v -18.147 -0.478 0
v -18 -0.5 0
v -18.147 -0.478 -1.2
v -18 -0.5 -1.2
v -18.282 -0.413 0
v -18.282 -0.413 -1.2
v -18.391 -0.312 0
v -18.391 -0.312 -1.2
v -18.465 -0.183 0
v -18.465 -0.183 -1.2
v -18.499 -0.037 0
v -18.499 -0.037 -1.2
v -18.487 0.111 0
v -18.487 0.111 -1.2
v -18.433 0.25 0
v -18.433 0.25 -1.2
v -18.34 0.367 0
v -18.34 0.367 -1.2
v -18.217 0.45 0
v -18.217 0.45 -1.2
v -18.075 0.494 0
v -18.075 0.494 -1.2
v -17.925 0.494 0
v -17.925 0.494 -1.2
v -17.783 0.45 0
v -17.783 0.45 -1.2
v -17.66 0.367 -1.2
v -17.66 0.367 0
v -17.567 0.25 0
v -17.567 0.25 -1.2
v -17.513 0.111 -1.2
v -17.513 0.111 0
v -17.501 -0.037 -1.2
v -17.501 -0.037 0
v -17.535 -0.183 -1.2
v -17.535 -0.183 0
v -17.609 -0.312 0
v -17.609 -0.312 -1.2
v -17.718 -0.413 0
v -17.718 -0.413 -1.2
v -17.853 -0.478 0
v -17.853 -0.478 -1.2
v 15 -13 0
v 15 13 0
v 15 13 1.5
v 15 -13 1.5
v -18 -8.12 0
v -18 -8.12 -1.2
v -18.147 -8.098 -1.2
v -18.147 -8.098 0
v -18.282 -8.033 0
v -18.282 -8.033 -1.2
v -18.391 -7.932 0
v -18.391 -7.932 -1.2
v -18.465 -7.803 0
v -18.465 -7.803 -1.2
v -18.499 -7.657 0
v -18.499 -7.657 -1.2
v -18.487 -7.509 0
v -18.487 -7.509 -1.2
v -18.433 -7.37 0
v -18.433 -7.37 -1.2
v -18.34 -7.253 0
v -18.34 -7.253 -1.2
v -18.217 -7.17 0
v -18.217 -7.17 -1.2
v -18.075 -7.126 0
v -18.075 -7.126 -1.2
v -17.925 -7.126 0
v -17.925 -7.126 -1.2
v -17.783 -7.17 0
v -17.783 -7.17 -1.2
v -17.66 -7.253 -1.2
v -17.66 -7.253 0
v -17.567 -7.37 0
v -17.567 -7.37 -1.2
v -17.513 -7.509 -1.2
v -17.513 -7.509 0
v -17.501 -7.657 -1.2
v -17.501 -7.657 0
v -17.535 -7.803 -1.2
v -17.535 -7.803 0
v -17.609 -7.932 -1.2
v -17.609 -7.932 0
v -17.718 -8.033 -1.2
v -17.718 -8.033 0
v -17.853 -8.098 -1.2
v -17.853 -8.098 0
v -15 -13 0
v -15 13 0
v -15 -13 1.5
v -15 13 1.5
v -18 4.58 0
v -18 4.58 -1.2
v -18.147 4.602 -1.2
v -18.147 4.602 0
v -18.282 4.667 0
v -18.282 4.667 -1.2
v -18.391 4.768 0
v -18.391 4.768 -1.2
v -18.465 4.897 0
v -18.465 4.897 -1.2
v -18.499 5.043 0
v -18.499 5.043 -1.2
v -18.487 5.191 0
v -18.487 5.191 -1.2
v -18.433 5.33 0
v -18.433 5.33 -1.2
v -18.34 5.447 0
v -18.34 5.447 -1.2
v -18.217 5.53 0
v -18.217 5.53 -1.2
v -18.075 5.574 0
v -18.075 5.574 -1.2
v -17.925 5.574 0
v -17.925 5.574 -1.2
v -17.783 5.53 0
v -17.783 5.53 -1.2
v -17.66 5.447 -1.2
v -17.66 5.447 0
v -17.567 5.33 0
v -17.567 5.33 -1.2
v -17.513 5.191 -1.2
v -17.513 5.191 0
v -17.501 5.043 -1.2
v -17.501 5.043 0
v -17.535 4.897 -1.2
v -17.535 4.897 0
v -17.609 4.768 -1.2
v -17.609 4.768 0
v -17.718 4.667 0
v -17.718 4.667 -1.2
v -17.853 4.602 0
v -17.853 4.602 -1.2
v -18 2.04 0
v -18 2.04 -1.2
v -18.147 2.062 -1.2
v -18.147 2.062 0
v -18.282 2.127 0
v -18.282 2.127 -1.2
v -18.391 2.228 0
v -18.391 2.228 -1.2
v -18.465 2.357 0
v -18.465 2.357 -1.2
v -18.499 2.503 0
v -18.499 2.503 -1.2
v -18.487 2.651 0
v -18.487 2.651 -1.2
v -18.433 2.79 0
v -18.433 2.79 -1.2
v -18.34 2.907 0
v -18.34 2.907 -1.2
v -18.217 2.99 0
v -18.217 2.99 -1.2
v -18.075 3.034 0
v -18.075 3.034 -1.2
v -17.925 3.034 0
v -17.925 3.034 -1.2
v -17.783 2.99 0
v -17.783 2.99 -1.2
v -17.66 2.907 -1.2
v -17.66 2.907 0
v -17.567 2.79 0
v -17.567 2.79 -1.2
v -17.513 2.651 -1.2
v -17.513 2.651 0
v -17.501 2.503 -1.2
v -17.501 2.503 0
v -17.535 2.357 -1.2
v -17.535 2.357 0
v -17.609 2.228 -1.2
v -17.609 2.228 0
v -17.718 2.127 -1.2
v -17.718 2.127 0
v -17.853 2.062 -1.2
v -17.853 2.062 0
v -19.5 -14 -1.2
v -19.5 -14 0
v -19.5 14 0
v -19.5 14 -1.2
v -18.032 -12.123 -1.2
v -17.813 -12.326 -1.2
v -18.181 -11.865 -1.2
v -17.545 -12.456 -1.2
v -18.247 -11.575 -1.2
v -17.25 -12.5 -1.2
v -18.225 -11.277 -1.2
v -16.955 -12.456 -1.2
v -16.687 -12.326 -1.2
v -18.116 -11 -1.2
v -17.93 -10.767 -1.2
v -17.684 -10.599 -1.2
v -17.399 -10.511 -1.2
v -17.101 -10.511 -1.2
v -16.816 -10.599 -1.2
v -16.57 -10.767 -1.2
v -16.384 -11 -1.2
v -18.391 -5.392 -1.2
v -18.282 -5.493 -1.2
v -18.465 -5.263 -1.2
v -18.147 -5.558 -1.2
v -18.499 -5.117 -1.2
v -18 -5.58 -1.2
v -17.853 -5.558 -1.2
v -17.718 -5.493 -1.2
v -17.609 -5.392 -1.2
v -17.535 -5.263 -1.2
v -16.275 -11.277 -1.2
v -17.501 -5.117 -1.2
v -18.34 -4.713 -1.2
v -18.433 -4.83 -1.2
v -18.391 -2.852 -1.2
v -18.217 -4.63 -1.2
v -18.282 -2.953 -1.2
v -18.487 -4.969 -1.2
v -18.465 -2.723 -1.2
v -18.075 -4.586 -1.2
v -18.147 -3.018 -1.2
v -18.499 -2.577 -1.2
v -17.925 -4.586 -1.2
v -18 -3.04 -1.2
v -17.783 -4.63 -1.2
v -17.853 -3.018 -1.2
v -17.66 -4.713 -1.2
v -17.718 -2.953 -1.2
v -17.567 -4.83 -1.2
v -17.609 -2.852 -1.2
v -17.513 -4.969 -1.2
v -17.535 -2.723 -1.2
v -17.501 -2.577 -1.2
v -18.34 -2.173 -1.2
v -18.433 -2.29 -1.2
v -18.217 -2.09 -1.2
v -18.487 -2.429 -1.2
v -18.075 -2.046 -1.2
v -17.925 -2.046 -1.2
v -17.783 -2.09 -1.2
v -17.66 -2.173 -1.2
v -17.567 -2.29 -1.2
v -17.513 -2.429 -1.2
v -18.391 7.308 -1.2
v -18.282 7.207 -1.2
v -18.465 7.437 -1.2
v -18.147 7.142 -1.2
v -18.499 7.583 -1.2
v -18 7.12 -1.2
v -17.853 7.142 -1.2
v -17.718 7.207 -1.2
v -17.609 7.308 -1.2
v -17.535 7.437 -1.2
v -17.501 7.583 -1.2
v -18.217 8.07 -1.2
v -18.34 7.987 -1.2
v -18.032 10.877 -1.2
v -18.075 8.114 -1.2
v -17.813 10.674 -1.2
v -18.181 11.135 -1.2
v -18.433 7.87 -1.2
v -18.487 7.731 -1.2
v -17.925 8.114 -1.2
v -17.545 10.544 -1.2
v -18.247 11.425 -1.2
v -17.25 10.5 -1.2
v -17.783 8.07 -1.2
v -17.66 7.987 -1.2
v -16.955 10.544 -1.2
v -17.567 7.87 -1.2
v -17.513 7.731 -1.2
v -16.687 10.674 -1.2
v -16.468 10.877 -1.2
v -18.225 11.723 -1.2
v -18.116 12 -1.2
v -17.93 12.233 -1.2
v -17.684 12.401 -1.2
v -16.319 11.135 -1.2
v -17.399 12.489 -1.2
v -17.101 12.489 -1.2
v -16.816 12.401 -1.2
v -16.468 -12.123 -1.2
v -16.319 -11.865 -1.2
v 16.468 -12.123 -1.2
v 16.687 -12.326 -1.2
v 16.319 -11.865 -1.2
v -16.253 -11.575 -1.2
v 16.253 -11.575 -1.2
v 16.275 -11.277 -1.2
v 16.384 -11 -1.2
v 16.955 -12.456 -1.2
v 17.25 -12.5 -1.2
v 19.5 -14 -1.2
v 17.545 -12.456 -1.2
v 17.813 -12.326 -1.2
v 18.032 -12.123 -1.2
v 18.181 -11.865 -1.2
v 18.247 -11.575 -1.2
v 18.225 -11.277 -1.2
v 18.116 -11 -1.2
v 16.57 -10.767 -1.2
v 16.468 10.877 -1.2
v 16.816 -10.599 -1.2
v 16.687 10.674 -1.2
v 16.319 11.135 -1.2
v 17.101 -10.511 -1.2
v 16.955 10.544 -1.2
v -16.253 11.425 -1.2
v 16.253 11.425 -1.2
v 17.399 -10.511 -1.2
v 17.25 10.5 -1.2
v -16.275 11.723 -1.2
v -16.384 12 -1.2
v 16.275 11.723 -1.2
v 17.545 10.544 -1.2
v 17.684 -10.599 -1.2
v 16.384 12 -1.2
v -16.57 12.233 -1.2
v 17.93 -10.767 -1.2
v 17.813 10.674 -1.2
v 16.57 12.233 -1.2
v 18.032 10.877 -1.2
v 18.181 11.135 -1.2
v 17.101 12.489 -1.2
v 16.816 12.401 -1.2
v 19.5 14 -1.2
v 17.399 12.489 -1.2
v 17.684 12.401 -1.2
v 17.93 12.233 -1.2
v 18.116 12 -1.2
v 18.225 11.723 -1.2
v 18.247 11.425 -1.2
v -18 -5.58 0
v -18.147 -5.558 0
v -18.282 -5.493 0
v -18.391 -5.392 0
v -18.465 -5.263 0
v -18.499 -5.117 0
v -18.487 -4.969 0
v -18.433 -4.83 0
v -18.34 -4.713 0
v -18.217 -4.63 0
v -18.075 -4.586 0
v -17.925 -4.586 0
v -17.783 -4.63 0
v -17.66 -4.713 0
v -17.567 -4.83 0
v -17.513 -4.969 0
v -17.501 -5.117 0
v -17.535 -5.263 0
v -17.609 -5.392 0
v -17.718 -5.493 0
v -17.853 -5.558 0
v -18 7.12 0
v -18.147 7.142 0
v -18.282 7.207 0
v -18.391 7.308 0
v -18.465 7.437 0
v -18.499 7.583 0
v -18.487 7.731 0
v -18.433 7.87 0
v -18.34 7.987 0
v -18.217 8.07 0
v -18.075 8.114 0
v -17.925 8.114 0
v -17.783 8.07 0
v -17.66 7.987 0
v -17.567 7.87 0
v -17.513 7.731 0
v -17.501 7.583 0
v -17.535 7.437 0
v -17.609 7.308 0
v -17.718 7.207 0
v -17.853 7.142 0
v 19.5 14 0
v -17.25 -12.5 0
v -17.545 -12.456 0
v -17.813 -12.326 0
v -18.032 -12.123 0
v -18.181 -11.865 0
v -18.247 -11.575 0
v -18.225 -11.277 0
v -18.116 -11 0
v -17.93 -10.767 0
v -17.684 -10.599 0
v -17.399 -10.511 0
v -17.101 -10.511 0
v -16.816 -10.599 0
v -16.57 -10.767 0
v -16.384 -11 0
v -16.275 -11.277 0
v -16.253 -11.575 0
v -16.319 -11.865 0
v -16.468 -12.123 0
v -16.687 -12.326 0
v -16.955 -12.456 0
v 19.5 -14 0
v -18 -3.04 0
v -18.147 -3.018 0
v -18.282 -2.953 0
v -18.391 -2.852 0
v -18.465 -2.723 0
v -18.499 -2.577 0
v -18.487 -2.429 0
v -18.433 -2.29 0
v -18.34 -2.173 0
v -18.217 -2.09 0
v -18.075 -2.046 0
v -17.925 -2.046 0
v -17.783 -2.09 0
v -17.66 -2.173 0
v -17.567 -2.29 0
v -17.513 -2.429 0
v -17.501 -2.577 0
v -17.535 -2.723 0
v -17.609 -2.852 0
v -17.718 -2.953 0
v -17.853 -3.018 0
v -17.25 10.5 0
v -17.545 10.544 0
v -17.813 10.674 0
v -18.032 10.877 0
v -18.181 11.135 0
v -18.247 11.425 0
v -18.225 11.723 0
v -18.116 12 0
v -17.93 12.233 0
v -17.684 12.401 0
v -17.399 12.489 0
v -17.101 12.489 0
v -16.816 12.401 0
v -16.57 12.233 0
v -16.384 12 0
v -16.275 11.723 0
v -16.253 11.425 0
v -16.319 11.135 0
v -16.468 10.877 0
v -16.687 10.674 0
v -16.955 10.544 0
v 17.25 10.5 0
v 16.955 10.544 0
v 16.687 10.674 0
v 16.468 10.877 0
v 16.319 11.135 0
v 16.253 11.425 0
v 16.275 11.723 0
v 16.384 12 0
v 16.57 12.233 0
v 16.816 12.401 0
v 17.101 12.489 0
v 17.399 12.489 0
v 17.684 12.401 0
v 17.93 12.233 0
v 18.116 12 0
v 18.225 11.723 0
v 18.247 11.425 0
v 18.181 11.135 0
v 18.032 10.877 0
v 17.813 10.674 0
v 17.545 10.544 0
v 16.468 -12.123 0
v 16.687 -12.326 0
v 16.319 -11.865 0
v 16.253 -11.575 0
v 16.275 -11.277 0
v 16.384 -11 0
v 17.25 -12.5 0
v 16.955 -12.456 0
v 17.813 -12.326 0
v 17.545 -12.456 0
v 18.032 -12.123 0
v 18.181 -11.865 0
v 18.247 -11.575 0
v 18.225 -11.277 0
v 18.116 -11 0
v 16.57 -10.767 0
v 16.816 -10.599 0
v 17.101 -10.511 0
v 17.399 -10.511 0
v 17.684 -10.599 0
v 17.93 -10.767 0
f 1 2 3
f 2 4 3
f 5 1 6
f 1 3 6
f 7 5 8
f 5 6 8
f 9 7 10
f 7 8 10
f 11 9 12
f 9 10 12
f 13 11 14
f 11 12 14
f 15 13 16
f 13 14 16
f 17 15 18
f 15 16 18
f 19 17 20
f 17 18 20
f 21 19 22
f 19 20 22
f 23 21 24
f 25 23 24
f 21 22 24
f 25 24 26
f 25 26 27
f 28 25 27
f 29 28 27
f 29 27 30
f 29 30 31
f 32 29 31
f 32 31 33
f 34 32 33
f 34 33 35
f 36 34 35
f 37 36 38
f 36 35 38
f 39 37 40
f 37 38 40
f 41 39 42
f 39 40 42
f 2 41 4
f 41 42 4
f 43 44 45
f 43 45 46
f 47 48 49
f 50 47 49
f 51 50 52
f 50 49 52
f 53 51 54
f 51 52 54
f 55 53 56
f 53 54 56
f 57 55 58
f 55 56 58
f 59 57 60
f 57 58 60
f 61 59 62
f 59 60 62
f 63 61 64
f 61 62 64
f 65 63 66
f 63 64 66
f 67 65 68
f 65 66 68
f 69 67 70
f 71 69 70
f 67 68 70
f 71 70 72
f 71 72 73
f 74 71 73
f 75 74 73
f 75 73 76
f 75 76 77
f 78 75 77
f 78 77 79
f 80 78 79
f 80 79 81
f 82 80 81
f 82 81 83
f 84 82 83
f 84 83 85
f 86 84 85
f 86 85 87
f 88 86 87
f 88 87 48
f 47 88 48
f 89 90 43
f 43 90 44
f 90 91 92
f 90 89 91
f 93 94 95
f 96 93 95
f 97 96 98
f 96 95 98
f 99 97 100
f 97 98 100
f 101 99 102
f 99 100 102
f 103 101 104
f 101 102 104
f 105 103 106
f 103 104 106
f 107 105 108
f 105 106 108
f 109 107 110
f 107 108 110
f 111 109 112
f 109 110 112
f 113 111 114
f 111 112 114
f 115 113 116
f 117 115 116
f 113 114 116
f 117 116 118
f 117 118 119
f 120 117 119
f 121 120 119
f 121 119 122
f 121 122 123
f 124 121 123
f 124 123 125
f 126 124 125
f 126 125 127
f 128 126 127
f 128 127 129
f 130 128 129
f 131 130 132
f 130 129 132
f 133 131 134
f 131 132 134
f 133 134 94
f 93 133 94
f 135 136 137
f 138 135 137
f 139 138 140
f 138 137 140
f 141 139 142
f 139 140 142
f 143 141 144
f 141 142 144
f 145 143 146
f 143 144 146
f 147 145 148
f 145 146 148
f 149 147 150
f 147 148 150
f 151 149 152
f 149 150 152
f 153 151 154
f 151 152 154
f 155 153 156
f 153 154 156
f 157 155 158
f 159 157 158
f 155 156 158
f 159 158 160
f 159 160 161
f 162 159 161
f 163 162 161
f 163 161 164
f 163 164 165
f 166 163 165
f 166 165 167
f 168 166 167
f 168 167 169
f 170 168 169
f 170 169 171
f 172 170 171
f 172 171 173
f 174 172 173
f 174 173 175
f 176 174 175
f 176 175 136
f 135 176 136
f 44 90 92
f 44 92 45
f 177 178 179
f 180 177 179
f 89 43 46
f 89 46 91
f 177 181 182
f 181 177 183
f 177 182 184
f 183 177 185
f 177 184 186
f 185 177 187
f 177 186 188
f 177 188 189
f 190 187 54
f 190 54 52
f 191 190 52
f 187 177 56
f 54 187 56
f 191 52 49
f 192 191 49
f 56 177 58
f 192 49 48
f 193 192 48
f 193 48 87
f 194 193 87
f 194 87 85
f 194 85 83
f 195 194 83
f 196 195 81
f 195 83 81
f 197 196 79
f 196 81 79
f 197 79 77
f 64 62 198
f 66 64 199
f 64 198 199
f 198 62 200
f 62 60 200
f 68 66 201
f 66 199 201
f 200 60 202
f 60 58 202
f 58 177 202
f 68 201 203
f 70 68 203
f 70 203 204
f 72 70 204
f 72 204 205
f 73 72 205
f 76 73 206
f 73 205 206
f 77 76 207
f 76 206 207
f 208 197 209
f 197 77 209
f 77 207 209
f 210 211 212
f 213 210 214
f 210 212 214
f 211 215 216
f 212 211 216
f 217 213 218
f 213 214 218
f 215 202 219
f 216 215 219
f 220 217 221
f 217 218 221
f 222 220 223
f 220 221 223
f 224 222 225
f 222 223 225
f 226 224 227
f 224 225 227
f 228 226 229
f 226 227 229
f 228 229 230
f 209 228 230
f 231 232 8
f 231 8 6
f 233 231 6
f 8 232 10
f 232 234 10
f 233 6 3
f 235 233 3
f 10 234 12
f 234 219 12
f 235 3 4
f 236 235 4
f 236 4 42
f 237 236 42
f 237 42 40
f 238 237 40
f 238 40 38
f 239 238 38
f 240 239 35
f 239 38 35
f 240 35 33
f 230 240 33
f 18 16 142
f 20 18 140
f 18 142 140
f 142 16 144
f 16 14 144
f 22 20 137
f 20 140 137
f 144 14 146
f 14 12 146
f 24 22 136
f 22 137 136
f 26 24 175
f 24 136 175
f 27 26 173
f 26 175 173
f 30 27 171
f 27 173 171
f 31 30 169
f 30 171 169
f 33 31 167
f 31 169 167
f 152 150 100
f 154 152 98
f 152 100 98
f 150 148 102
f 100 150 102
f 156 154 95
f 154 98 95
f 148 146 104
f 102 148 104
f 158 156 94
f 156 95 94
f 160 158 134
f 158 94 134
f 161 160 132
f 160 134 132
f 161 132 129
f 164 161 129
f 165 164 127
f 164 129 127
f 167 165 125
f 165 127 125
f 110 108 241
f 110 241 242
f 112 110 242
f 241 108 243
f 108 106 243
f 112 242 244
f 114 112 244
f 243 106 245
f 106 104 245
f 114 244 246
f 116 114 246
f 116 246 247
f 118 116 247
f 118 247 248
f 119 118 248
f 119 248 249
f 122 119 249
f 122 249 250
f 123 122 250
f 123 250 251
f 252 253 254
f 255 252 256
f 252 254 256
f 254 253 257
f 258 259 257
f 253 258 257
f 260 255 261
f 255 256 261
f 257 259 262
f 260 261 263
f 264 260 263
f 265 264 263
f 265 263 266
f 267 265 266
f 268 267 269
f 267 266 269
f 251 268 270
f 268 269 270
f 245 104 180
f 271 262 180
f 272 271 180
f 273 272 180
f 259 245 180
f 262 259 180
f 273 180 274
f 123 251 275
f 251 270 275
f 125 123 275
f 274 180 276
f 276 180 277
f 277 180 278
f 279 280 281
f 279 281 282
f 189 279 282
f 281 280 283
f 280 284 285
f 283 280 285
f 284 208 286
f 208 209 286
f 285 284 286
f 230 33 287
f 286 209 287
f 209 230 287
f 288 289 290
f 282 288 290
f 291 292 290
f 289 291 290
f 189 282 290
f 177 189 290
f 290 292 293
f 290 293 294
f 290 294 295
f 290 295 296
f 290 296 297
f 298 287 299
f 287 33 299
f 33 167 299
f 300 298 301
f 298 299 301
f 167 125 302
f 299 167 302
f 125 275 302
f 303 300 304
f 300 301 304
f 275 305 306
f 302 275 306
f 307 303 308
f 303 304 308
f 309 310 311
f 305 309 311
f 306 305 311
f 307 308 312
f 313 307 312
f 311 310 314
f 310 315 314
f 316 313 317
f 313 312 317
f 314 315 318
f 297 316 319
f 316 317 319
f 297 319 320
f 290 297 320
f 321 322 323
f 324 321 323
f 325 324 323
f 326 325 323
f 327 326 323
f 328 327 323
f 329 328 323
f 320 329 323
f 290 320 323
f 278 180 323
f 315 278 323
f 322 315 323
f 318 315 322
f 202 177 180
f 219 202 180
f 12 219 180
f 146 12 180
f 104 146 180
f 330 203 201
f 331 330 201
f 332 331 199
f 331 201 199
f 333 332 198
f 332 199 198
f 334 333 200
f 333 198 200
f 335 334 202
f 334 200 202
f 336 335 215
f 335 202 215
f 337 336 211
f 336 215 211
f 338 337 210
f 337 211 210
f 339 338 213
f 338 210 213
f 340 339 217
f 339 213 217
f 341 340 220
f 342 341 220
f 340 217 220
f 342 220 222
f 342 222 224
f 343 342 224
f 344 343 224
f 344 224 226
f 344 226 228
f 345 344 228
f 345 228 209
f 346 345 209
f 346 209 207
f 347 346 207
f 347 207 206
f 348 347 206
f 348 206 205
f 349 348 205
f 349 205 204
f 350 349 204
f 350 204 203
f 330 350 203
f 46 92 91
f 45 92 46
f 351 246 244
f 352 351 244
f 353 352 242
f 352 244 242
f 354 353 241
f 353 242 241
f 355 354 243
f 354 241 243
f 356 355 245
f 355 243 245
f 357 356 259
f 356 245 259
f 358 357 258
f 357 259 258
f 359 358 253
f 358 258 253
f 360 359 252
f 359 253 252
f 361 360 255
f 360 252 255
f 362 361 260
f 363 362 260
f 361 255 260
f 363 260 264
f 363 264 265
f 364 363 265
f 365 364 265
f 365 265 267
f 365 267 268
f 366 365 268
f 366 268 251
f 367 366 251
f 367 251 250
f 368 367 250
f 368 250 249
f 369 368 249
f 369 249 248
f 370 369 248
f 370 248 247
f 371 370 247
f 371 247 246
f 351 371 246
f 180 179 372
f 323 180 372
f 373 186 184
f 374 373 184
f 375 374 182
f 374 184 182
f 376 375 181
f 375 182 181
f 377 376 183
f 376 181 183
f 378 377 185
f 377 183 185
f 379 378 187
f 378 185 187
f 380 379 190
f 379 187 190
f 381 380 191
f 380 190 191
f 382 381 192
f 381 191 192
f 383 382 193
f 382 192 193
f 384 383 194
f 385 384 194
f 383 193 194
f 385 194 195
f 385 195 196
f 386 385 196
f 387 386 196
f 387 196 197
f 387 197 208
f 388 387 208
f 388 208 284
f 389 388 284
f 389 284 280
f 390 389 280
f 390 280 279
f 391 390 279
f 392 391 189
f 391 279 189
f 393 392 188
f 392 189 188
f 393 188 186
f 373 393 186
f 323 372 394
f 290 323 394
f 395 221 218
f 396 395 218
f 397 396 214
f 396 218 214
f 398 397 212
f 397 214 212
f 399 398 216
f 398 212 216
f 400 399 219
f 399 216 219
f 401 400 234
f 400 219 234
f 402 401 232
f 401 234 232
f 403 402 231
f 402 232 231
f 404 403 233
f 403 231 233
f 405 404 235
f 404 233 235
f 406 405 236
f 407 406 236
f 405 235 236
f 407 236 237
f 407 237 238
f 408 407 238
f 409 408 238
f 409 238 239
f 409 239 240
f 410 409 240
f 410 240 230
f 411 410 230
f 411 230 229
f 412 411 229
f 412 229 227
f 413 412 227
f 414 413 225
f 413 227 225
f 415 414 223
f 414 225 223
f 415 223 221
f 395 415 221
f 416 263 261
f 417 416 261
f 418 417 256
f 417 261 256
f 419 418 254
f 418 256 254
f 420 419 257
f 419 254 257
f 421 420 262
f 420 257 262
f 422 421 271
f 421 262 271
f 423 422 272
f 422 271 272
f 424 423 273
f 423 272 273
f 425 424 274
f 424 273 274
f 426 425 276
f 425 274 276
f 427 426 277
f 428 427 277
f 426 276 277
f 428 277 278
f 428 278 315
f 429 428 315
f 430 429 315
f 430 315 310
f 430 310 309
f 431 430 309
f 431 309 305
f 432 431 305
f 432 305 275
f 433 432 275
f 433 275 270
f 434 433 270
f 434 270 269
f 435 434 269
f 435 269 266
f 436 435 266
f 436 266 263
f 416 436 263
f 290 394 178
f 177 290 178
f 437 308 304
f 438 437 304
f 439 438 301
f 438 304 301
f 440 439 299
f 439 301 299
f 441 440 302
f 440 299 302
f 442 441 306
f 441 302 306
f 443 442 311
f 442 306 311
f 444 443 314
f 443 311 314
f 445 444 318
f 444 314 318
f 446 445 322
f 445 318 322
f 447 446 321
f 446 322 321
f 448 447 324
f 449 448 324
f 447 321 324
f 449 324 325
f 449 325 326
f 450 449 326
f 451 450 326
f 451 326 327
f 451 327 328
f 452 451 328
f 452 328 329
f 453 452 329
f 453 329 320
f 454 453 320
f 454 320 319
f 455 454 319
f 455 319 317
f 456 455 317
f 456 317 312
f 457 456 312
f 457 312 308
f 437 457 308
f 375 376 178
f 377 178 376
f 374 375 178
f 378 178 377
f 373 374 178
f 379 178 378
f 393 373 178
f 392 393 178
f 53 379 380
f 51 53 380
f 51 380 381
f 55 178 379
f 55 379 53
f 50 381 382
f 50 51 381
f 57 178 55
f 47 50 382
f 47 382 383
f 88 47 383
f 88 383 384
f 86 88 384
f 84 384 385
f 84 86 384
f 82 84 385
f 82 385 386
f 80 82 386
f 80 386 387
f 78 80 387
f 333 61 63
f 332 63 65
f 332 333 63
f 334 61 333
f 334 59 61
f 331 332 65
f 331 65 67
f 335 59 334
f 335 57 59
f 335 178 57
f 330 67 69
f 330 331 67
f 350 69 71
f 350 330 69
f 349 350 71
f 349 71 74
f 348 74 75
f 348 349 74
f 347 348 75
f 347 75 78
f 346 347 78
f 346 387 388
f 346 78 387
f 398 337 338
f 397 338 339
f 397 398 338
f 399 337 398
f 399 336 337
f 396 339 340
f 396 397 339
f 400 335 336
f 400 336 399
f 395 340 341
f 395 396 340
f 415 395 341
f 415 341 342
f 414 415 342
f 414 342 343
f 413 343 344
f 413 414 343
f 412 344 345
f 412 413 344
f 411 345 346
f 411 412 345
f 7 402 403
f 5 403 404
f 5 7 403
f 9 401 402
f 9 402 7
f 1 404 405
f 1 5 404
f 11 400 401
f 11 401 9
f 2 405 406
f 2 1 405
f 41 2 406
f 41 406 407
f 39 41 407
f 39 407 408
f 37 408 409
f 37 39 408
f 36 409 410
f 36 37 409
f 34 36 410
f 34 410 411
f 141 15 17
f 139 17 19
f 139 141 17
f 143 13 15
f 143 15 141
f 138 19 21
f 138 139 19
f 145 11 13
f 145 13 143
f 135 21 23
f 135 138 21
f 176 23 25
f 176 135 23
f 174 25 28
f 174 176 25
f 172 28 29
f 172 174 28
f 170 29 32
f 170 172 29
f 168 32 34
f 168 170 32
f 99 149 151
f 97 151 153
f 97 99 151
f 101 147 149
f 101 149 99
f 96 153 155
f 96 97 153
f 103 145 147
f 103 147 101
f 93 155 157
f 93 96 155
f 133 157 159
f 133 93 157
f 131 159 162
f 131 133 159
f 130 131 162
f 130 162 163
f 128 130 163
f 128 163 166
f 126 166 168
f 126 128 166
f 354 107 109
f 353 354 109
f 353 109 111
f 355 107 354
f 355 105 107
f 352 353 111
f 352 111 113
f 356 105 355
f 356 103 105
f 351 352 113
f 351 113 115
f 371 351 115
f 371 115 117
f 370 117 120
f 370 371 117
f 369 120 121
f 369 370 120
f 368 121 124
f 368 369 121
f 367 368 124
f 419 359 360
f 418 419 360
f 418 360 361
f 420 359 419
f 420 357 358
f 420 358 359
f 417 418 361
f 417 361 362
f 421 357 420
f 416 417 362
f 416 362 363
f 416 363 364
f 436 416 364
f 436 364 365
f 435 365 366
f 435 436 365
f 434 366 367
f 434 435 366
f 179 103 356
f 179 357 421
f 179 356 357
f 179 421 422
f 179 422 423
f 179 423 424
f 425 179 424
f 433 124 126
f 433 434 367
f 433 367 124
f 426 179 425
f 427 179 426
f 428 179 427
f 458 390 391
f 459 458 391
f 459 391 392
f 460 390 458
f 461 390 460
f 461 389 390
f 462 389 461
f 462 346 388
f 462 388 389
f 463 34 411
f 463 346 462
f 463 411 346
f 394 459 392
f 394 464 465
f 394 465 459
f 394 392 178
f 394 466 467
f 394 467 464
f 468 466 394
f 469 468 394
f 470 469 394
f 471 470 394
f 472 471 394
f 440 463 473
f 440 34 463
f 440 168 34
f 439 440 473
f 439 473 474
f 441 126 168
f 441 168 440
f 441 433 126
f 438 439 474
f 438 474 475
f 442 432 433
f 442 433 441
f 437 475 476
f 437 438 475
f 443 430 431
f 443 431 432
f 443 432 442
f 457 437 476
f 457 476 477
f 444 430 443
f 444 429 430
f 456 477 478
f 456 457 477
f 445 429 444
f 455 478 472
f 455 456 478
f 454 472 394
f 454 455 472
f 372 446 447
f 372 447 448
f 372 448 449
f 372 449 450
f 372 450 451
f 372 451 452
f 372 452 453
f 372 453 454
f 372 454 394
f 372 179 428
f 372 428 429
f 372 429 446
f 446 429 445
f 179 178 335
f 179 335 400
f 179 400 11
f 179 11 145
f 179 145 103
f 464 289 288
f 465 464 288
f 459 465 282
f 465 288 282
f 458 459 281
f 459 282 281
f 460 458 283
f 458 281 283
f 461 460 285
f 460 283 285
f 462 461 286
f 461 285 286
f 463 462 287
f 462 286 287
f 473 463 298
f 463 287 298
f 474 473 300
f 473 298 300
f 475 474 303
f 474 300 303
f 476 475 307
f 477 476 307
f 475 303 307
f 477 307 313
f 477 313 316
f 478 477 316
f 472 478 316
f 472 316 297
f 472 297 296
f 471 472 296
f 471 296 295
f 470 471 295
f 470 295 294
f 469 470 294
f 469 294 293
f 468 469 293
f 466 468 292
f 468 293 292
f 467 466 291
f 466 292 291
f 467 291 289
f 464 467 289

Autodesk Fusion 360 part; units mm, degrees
sketch "Sketch1" plane through (0, 0, 0) normal (0, 0, 1) x (1, 0, 0)
  line L0 (-19.5, 14) -> (19.5, 14)
  line L1 (19.5, 14) -> (19.5, -14)
  line L2 (19.5, -14) -> (-19.5, -14)
  line L3 (-19.5, -14) -> (-19.5, 14)
  line L4 (0, 14) -> (0, -14) construction
  line L5 (-19.5, 0) -> (19.5, 0) construction
  circle A0 centre (-17.25, 11.5) radius 1 construction
  circle A1 centre (17.25, 11.5) radius 1 construction
  circle A2 centre (-17.25, -11.5) radius 1 construction
  circle A3 centre (17.25, -11.5) radius 1 construction
  line L6 (-17.25, 11.5) -> (17.25, 11.5) construction
  line L7 (17.25, 11.5) -> (17.25, -11.5) construction
  line L8 (17.25, -11.5) -> (-17.25, -11.5) construction
  line L9 (-17.25, -11.5) -> (-17.25, 11.5) construction
  point P0 (-18, 14)
  point P1 (-18, -14)
  dimension "d1" = 28
  dimension "d2" = 39
  dimension "d3" = 17.25
  dimension "d4" = 17.25
  dimension "d5" = 11.5
  dimension "d6" = 11.5
  dimension "d7" = 2
  dimension "d27" = 1.5
  dimension "d28" = 1.5
extrude "Extrude1" add sketch "Sketch1" against normal blind 1.2 makes body 1
hole "Hole1" at (-17.25, 11.5, 0) at (17.25, 11.5, 0) at (17.25, -11.5, 0) at (-17.25, -11.5, 0) direction (0, 0, -1) diameter 2 depth 1.2 tip angle 180 bodies 1
sketch "Sketch2" plane through (0, 0, 0) normal (0, 0, 1) x (1, 0, 0)
  line L0 (-15, 13) -> (15, 13)
  line L1 (15, 13) -> (15, -13)
  line L2 (15, -13) -> (-15, -13)
  line L3 (-15, -13) -> (-15, 13)
  line L4 (0, 13) -> (0, -12.6799) construction
  line L5 (-15, 0) -> (15, 0) construction
  dimension "d13" = 26
  dimension "d14" = 30
extrude "Extrude2" add sketch "Sketch2" along normal blind 1.5 separate body makes body 2
sketch "Sketch4" plane through (0, 0, 0) normal (0, 0, 1) x (1, 0, 0)
  line L0 (-18, 14) -> (-18, -14) construction
  circle A0 centre (-18, 0) radius 0.5 construction
  circle A1 centre (-18, 2.54) radius 0.5 construction
  circle A2 centre (-18, 5.08) radius 0.5 construction
  circle A3 centre (-18, 7.62) radius 0.5 construction
  circle A4 centre (-18, -2.54) radius 0.5 construction
  circle A5 centre (-18, -5.08) radius 0.5 construction
  circle A6 centre (-18, -7.62) radius 0.5 construction
  dimension "d29" = 1
  dimension "d30" = 2.54
  dimension "d31" = 2.54
  dimension "d32" = 2.54
  dimension "d33" = 2.54
  dimension "d34" = 2.54
  dimension "d35" = 2.54
hole "Hole2" at (-18, 7.62, 0) at (-18, 5.08, 0) at (-18, 2.54, 0) at (-18, 0, 0) at (-18, -2.54, 0) at (-18, -5.08, 0) at (-18, -7.62, 0) direction (0, 0, -1) diameter 1 depth 1.2 tip angle 180 bodies 1
equation "d4 = d3"
equation "d6 = d5"
equation "d31 = d30"
equation "d32 = d30"
equation "d33 = d30"
equation "d34 = d30"
equation "d35 = d30"
